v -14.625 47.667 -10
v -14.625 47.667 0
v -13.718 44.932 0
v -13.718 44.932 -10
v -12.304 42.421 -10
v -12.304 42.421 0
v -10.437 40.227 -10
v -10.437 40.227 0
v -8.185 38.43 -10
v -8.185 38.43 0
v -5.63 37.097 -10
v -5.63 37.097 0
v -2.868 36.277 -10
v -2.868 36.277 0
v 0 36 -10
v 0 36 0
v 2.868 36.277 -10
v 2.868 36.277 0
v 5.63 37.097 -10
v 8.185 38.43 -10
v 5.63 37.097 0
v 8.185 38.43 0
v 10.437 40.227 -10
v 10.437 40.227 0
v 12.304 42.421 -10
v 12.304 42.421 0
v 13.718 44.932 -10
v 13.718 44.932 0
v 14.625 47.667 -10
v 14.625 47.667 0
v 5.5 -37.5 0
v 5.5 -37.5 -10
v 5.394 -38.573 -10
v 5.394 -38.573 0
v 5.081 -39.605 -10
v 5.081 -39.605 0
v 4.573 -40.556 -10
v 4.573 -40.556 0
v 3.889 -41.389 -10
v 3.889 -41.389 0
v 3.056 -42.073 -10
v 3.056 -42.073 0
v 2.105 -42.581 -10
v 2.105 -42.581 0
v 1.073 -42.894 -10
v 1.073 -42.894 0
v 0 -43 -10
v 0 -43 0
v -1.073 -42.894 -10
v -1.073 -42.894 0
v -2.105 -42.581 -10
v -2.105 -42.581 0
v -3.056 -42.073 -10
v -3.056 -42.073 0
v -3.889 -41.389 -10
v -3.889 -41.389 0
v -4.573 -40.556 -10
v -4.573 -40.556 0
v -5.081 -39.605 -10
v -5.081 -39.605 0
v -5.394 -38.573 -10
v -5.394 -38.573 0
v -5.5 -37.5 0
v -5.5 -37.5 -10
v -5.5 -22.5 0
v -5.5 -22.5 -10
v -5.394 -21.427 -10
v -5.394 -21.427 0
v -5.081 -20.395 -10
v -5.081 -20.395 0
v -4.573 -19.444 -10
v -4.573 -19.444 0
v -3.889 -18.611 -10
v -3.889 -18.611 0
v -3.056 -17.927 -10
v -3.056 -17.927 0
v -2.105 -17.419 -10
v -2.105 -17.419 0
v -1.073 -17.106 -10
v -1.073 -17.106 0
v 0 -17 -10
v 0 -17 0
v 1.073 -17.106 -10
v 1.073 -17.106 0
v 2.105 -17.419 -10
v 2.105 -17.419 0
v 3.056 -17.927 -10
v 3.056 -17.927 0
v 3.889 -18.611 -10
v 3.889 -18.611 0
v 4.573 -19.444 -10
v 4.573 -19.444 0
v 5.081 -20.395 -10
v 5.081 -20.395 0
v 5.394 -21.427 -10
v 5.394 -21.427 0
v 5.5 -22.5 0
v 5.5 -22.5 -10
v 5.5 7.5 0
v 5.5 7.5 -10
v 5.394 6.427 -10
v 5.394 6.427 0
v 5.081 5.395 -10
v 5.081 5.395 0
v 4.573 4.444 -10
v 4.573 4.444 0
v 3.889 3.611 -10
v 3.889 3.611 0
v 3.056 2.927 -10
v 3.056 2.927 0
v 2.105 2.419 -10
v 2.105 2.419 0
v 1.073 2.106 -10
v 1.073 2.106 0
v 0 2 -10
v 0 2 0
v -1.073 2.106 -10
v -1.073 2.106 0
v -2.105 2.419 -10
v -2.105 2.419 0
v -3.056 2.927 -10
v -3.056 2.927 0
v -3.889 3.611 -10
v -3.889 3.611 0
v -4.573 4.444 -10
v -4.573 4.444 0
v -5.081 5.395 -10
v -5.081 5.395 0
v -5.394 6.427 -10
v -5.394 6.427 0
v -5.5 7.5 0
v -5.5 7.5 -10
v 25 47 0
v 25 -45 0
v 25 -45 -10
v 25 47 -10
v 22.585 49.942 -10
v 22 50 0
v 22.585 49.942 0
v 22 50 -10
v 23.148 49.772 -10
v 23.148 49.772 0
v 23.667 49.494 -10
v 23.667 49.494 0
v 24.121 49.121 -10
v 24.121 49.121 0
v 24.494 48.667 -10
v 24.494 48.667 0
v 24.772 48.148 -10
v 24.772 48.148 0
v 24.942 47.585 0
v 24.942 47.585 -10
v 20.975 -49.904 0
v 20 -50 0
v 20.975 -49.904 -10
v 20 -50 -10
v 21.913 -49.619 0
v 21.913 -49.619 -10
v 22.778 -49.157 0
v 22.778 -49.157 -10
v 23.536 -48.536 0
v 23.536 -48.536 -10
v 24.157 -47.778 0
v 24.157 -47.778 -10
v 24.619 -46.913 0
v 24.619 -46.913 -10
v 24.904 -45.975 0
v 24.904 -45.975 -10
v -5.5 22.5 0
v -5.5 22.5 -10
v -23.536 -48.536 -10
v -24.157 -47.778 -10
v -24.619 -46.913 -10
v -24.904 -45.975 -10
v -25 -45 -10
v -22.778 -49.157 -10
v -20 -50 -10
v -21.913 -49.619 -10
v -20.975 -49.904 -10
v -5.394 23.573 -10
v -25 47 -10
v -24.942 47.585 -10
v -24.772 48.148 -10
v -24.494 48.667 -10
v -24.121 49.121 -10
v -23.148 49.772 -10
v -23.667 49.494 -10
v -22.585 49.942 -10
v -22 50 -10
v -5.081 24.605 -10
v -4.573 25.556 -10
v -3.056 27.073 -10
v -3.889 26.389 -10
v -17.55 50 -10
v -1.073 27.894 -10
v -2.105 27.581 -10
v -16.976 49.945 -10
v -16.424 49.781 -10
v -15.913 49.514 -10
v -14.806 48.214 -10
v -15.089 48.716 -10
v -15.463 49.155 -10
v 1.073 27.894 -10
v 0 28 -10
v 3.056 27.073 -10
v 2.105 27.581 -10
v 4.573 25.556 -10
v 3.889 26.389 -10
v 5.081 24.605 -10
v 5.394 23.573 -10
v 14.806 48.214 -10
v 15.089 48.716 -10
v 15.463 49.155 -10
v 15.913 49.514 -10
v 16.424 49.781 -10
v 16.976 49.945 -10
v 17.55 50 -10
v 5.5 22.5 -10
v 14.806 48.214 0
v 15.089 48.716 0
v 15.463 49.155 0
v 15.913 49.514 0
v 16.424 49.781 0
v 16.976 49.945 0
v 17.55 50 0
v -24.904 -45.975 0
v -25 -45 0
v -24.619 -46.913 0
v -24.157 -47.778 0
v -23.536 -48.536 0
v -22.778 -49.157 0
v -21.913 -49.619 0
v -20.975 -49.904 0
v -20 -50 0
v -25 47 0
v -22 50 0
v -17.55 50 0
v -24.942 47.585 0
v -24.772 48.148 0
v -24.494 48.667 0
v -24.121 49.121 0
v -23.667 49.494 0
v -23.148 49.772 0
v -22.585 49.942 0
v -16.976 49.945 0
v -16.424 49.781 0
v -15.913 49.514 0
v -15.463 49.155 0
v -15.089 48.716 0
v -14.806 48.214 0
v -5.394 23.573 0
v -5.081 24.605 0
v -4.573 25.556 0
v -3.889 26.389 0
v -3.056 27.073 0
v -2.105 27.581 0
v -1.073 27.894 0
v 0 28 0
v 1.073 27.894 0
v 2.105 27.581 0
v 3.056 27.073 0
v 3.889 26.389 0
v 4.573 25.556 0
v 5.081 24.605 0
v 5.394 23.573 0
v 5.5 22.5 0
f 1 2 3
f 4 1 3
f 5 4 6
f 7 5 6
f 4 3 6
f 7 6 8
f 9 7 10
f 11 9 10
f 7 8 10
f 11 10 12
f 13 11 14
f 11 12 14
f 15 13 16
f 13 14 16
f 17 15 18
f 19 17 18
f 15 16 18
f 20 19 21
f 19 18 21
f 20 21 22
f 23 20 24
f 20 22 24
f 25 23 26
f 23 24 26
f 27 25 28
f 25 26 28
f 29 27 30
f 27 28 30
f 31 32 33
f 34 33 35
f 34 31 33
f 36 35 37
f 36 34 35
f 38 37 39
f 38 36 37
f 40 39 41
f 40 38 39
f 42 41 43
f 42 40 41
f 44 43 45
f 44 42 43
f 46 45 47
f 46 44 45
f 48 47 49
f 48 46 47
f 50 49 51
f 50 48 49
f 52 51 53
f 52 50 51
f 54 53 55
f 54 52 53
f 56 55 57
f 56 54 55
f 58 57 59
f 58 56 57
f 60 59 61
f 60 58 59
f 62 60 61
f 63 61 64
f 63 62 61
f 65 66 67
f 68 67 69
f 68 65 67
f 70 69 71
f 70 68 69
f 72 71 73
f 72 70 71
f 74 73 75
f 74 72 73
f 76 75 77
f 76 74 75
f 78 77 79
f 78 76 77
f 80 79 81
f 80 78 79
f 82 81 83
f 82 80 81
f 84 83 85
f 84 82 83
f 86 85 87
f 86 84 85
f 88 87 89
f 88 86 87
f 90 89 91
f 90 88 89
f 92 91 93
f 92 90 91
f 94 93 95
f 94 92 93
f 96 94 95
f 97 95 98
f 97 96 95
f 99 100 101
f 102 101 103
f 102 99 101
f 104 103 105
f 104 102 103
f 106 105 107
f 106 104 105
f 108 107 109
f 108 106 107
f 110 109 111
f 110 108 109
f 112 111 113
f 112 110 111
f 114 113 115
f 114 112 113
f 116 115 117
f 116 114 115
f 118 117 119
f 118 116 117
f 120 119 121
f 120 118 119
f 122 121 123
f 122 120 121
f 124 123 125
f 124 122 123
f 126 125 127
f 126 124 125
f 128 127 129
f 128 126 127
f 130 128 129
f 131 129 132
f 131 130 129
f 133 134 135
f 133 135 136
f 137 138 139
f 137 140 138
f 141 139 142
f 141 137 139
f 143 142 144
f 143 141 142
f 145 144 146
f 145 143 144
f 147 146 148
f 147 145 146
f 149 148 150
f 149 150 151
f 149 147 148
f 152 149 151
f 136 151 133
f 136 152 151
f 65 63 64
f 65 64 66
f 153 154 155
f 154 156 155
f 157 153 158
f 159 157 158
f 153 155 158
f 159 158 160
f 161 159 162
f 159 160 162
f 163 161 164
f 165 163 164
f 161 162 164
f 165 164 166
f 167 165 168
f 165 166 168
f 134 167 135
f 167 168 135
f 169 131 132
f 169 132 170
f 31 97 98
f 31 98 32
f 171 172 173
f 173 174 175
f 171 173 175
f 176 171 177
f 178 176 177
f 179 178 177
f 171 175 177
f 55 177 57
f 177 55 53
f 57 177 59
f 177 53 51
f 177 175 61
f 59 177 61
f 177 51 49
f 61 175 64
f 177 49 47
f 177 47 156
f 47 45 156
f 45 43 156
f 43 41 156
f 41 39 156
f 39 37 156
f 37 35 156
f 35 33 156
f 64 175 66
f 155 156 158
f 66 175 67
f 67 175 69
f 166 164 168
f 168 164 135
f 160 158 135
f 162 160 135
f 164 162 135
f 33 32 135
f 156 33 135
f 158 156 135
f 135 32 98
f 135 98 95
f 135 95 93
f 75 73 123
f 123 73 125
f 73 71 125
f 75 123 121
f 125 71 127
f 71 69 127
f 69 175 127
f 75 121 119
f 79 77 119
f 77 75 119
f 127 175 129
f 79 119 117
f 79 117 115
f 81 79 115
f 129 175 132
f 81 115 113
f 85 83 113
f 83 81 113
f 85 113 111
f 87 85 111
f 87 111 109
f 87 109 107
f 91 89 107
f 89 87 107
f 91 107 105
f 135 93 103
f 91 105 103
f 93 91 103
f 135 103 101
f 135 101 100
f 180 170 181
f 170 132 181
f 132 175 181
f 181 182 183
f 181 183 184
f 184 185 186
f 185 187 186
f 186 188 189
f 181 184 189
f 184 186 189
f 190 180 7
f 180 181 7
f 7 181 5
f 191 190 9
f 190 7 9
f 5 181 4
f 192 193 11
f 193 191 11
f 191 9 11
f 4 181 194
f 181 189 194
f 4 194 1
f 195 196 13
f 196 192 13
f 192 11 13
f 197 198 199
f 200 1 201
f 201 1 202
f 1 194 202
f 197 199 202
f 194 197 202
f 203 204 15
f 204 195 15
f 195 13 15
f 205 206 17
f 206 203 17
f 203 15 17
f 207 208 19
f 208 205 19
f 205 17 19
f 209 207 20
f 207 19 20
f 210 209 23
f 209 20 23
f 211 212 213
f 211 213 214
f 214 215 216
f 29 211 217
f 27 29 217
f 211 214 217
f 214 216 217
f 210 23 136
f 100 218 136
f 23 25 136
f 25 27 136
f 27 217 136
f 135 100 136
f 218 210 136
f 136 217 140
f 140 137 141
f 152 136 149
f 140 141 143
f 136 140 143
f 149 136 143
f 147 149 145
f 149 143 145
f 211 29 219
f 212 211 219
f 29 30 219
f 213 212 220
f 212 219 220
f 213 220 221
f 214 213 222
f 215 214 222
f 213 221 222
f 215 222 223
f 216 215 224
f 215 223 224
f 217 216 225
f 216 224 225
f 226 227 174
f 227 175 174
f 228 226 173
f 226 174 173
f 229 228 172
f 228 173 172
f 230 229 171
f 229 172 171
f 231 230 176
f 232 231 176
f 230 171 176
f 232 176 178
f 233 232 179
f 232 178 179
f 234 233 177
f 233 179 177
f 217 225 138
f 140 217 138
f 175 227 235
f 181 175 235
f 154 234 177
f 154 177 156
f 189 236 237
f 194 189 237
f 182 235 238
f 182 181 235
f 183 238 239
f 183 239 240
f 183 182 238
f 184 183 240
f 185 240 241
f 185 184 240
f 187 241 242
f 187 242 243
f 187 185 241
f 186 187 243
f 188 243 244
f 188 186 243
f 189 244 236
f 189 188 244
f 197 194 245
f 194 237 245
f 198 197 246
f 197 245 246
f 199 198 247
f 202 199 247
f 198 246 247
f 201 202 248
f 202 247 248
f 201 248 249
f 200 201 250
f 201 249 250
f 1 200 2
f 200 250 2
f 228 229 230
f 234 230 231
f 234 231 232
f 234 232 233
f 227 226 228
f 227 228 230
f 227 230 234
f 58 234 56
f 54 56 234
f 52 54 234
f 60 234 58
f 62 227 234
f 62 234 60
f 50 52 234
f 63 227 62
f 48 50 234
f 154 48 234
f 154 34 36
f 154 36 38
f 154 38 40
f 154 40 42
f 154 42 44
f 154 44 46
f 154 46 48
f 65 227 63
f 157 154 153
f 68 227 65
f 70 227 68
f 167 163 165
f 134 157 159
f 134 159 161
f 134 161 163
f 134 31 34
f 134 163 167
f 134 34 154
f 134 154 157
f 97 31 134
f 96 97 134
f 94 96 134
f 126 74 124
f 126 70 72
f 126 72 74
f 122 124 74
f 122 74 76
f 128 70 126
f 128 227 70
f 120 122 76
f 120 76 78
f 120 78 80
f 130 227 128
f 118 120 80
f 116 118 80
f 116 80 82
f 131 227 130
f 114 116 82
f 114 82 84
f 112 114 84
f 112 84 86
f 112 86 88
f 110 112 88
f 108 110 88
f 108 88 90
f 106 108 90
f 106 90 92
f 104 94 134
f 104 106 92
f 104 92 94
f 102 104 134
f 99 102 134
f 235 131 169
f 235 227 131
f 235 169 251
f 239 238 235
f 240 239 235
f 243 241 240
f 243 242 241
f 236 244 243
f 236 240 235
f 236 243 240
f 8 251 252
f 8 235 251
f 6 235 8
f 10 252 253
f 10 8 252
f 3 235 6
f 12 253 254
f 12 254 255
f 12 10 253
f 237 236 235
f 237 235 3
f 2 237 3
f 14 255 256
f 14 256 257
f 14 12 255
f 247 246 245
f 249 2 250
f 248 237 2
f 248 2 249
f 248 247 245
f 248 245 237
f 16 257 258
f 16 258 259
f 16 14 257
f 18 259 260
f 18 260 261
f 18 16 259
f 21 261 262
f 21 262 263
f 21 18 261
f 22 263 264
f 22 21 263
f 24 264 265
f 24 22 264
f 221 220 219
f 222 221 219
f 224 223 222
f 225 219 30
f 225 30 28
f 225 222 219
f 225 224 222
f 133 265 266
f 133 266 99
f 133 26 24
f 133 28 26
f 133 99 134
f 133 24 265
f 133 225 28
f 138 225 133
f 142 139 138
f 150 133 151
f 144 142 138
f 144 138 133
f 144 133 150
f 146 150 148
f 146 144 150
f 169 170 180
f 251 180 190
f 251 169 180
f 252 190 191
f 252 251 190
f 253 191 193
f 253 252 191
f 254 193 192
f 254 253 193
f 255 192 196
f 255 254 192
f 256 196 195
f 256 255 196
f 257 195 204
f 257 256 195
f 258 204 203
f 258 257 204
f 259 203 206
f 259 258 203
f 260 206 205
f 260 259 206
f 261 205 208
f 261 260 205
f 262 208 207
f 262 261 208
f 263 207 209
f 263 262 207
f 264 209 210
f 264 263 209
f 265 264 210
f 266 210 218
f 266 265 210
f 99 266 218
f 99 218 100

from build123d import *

# Parameters (mm, degrees)
IZIM1_W               = 50
IZIM1_H               = 100
TABAN_FLAN_1_DEPTH    = 10
KES_EKSTR_ZYON1_DEPTH = 20
RADYUS1_R             = 5
IZIM7_R               = 15
KES_EKSTR_ZYON2_DEPTH = 10
RADYUS2_R             = 3


# Sheet-metal steps are written as plain solids
with BuildPart() as part:
    # Çizim1 → Taban-Flanş1 (new body)
    with BuildSketch(Plane.XY):
        Rectangle(IZIM1_W, IZIM1_H)
    extrude(amount=-TABAN_FLAN_1_DEPTH)

    # Çizim6 → Kes-Ekstrüzyon1 (cut)
    with BuildSketch(Plane.XY):
        with BuildLine():
            Line((5.5, 22.5), (5.5, 7.5))
            ThreePointArc((5.5, 7.5), (0, 2), (-5.5, 7.5))
            Line((-5.5, 7.5), (-5.5, 22.5))
            ThreePointArc((-5.5, 22.5), (0, 28), (5.5, 22.5))
        make_face()
        with BuildLine():
            Line((-5.5, -37.5), (-5.5, -22.5))
            ThreePointArc((-5.5, -22.5), (0, -17), (5.5, -22.5))
            Line((5.5, -22.5), (5.5, -37.5))
            ThreePointArc((5.5, -37.5), (0, -43), (-5.5, -37.5))
        make_face()
    extrude(amount=-KES_EKSTR_ZYON1_DEPTH, mode=Mode.SUBTRACT)

    # Radyus1
    radyus1_edges = [part.edges().sort_by_distance(p)[0] for p in [
        (25, -50, -5),
        (-25, -50, -5),
    ]]
    fillet(radyus1_edges, radius=RADYUS1_R)

    # Çizim7 → Kes-Ekstrüzyon2 (cut)
    with BuildSketch(Plane.XY):
        with Locations((0, 51)):
            Circle(IZIM7_R)
    extrude(amount=-KES_EKSTR_ZYON2_DEPTH, mode=Mode.SUBTRACT)

    # Radyus2
    radyus2_edges = [part.edges().sort_by_distance(p)[0] for p in [
        (-14.966629547, 50, -5),
        (14.966629547, 50, -5),
        (-25, 50, -5),
        (25, 50, -5),
    ]]
    fillet(radyus2_edges, radius=RADYUS2_R)


solid = part.part
